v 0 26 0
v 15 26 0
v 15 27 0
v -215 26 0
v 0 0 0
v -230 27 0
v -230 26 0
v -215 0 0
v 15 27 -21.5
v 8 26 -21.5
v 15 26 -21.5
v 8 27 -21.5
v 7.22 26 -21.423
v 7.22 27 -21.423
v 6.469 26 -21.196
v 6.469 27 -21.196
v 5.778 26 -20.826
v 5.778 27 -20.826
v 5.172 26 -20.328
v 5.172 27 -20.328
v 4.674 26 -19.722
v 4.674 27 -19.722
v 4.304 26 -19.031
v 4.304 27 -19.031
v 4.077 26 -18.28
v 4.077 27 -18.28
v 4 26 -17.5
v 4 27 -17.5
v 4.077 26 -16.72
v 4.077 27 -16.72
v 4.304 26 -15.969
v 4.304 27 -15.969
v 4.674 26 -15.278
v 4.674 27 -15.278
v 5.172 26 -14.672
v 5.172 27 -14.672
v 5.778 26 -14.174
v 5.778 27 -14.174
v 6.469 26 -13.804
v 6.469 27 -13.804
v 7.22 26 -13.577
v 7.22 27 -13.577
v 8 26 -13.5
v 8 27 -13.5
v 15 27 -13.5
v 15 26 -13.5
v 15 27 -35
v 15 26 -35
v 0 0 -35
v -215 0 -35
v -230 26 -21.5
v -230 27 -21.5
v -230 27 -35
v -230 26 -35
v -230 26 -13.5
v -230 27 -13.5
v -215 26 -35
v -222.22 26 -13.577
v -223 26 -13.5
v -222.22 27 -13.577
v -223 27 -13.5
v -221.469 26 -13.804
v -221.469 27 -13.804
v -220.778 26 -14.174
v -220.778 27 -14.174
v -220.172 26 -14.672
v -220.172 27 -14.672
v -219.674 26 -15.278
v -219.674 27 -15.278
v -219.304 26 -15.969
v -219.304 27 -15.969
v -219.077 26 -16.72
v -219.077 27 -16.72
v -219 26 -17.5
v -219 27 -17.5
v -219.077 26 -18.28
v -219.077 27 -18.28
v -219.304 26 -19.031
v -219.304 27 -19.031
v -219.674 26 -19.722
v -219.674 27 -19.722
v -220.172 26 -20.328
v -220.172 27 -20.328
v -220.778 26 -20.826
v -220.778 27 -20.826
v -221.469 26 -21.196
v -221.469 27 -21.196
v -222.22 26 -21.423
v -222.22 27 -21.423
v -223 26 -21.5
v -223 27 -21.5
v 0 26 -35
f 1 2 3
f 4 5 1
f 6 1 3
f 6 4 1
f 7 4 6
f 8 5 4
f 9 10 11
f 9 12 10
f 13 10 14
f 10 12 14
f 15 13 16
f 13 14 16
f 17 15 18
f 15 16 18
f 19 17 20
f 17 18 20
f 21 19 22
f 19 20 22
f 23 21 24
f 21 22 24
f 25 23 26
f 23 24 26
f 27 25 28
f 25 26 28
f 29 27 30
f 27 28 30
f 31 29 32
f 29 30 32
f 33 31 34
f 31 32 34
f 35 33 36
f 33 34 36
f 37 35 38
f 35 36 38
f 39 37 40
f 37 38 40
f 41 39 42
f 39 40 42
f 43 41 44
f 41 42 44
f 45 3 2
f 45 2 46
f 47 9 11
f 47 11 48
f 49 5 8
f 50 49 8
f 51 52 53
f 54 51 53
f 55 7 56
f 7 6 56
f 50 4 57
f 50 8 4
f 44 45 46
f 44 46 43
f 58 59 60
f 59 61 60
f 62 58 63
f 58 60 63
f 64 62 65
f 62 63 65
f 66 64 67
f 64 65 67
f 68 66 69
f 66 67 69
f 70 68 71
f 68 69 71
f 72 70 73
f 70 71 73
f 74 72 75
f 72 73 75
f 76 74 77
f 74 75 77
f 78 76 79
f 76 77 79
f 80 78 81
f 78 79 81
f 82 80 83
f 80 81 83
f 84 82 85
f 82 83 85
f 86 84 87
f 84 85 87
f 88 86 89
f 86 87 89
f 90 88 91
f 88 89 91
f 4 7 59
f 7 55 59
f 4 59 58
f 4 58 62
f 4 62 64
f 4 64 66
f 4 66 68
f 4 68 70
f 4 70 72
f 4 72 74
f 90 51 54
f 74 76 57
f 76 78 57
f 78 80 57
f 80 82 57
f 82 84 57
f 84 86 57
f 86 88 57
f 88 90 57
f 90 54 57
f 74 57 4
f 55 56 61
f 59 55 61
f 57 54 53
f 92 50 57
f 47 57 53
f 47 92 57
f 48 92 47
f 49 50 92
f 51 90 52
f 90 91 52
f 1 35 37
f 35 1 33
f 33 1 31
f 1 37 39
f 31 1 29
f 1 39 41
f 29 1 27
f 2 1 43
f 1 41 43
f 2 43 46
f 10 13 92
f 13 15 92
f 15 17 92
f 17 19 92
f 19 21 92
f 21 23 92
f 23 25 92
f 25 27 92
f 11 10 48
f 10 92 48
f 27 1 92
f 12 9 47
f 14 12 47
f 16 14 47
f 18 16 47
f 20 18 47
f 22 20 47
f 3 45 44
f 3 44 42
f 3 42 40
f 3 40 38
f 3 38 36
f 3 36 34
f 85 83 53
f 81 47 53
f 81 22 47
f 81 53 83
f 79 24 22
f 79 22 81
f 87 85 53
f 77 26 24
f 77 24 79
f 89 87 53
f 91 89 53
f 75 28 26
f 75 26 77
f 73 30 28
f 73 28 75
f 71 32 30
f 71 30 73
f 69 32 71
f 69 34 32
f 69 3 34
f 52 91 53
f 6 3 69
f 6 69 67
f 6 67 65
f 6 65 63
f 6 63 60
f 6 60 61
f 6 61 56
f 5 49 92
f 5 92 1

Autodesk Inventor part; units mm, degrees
ref_plane "YZ Plane" through (0, 0, 0) normal (1, 0, 0) x (0, 1, 0)
ref_plane "XZ Plane" through (0, 0, 0) normal (0, 1, 0) x (-1, 0, 0)
ref_plane "XY Plane" through (0, 0, 0) normal (0, 0, 1) x (1, 0, 0)
sketch "Sketch1" plane through (0, 0, 0) normal (0, 1, 0) x (-1, 0, 0)
  line L0 (0, 0) -> (215, 0)
  line L1 (215, 0) -> (215, -35)
  line L2 (215, -35) -> (0, -35)
  line L3 (0, -35) -> (0, 0)
  dimension "d0" = 215
  dimension "d1" = 35
extrude "Extrusion1" add sketch "Sketch1" along normal blind 27
sketch "Sketch2" plane through (0, 27, 0) normal (0, 1, 0) x (1, 0, 0)
  line L0 (0, 0) -> (15, 0)
  line L1 (15, 0) -> (15, 35)
  line L2 (15, 35) -> (0, 35)
  line L3 (0, 35) -> (0, 0)
  line L4 (-215, 35) -> (-215, 0) projected
  line L5 (-215, 0) -> (-230, 0)
  line L6 (-230, 0) -> (-230, 35)
  line L7 (-230, 35) -> (-215, 35)
  line L8 (-215, 35) -> (-215, 0)
  dimension "d4" = 15
  dimension "d5" = 35
  dimension "d6" = 15
  dimension "d7" = 35
extrude "Extrusion2" add sketch "Sketch2" against normal blind 1
sketch "Sketch3" plane through (0, 27, 0) normal (0, 1, 0) x (1, 0, 0)
  line L0 (15, 13.5) -> (8, 13.5)
  line L1 (4, 17.5) -> (4, 17.5)
  line L2 (8, 21.5) -> (15, 21.5)
  line L3 (15, 21.5) -> (15, 13.5)
  line L4 (15, 35) -> (-230, 35) projected
  line L5 (15, 0) -> (15, 35) projected
  line L6 (-230, 13.5) -> (-223, 13.5)
  line L7 (-219, 17.5) -> (-219, 17.5)
  line L8 (-223, 21.5) -> (-230, 21.5)
  line L9 (-230, 21.5) -> (-230, 13.5)
  line L10 (15, 0) -> (-230, 0) projected
  arc A0 (-223, 13.5) -> (-219, 17.5) centre (-223, 17.5) ccw
  arc A1 (-219, 17.5) -> (-223, 21.5) centre (-223, 17.5) ccw
  line L11 (-230, 0) -> (-230, 35) projected
  arc A2 (4, 17.5) -> (8, 13.5) centre (8, 17.5) ccw
  arc A3 (8, 21.5) -> (4, 17.5) centre (8, 17.5) ccw
  point P0 (0, 0)
  point P1 (4, 21.5)
  point P2 (4, 13.5)
  point P3 (-219, 21.5)
  point P4 (-219, 13.5)
  dimension "d10" = 11
  dimension "d11" = 8
  dimension "d12" = 13.5
  dimension "d13" = 0
  dimension "d14" = 11
  dimension "d15" = 8
  dimension "d16" = 13.5
  dimension "d17" = 4
  dimension "d18" = 4
  dimension "d19" = 0
  dimension "d20" = 4
extrude "Extrusion3" cut sketch "Sketch3" against normal blind 1 contours L0 A2 A3 L2 L3 | L9 L8 A1 A0 L6
properties part number "Balastro"
